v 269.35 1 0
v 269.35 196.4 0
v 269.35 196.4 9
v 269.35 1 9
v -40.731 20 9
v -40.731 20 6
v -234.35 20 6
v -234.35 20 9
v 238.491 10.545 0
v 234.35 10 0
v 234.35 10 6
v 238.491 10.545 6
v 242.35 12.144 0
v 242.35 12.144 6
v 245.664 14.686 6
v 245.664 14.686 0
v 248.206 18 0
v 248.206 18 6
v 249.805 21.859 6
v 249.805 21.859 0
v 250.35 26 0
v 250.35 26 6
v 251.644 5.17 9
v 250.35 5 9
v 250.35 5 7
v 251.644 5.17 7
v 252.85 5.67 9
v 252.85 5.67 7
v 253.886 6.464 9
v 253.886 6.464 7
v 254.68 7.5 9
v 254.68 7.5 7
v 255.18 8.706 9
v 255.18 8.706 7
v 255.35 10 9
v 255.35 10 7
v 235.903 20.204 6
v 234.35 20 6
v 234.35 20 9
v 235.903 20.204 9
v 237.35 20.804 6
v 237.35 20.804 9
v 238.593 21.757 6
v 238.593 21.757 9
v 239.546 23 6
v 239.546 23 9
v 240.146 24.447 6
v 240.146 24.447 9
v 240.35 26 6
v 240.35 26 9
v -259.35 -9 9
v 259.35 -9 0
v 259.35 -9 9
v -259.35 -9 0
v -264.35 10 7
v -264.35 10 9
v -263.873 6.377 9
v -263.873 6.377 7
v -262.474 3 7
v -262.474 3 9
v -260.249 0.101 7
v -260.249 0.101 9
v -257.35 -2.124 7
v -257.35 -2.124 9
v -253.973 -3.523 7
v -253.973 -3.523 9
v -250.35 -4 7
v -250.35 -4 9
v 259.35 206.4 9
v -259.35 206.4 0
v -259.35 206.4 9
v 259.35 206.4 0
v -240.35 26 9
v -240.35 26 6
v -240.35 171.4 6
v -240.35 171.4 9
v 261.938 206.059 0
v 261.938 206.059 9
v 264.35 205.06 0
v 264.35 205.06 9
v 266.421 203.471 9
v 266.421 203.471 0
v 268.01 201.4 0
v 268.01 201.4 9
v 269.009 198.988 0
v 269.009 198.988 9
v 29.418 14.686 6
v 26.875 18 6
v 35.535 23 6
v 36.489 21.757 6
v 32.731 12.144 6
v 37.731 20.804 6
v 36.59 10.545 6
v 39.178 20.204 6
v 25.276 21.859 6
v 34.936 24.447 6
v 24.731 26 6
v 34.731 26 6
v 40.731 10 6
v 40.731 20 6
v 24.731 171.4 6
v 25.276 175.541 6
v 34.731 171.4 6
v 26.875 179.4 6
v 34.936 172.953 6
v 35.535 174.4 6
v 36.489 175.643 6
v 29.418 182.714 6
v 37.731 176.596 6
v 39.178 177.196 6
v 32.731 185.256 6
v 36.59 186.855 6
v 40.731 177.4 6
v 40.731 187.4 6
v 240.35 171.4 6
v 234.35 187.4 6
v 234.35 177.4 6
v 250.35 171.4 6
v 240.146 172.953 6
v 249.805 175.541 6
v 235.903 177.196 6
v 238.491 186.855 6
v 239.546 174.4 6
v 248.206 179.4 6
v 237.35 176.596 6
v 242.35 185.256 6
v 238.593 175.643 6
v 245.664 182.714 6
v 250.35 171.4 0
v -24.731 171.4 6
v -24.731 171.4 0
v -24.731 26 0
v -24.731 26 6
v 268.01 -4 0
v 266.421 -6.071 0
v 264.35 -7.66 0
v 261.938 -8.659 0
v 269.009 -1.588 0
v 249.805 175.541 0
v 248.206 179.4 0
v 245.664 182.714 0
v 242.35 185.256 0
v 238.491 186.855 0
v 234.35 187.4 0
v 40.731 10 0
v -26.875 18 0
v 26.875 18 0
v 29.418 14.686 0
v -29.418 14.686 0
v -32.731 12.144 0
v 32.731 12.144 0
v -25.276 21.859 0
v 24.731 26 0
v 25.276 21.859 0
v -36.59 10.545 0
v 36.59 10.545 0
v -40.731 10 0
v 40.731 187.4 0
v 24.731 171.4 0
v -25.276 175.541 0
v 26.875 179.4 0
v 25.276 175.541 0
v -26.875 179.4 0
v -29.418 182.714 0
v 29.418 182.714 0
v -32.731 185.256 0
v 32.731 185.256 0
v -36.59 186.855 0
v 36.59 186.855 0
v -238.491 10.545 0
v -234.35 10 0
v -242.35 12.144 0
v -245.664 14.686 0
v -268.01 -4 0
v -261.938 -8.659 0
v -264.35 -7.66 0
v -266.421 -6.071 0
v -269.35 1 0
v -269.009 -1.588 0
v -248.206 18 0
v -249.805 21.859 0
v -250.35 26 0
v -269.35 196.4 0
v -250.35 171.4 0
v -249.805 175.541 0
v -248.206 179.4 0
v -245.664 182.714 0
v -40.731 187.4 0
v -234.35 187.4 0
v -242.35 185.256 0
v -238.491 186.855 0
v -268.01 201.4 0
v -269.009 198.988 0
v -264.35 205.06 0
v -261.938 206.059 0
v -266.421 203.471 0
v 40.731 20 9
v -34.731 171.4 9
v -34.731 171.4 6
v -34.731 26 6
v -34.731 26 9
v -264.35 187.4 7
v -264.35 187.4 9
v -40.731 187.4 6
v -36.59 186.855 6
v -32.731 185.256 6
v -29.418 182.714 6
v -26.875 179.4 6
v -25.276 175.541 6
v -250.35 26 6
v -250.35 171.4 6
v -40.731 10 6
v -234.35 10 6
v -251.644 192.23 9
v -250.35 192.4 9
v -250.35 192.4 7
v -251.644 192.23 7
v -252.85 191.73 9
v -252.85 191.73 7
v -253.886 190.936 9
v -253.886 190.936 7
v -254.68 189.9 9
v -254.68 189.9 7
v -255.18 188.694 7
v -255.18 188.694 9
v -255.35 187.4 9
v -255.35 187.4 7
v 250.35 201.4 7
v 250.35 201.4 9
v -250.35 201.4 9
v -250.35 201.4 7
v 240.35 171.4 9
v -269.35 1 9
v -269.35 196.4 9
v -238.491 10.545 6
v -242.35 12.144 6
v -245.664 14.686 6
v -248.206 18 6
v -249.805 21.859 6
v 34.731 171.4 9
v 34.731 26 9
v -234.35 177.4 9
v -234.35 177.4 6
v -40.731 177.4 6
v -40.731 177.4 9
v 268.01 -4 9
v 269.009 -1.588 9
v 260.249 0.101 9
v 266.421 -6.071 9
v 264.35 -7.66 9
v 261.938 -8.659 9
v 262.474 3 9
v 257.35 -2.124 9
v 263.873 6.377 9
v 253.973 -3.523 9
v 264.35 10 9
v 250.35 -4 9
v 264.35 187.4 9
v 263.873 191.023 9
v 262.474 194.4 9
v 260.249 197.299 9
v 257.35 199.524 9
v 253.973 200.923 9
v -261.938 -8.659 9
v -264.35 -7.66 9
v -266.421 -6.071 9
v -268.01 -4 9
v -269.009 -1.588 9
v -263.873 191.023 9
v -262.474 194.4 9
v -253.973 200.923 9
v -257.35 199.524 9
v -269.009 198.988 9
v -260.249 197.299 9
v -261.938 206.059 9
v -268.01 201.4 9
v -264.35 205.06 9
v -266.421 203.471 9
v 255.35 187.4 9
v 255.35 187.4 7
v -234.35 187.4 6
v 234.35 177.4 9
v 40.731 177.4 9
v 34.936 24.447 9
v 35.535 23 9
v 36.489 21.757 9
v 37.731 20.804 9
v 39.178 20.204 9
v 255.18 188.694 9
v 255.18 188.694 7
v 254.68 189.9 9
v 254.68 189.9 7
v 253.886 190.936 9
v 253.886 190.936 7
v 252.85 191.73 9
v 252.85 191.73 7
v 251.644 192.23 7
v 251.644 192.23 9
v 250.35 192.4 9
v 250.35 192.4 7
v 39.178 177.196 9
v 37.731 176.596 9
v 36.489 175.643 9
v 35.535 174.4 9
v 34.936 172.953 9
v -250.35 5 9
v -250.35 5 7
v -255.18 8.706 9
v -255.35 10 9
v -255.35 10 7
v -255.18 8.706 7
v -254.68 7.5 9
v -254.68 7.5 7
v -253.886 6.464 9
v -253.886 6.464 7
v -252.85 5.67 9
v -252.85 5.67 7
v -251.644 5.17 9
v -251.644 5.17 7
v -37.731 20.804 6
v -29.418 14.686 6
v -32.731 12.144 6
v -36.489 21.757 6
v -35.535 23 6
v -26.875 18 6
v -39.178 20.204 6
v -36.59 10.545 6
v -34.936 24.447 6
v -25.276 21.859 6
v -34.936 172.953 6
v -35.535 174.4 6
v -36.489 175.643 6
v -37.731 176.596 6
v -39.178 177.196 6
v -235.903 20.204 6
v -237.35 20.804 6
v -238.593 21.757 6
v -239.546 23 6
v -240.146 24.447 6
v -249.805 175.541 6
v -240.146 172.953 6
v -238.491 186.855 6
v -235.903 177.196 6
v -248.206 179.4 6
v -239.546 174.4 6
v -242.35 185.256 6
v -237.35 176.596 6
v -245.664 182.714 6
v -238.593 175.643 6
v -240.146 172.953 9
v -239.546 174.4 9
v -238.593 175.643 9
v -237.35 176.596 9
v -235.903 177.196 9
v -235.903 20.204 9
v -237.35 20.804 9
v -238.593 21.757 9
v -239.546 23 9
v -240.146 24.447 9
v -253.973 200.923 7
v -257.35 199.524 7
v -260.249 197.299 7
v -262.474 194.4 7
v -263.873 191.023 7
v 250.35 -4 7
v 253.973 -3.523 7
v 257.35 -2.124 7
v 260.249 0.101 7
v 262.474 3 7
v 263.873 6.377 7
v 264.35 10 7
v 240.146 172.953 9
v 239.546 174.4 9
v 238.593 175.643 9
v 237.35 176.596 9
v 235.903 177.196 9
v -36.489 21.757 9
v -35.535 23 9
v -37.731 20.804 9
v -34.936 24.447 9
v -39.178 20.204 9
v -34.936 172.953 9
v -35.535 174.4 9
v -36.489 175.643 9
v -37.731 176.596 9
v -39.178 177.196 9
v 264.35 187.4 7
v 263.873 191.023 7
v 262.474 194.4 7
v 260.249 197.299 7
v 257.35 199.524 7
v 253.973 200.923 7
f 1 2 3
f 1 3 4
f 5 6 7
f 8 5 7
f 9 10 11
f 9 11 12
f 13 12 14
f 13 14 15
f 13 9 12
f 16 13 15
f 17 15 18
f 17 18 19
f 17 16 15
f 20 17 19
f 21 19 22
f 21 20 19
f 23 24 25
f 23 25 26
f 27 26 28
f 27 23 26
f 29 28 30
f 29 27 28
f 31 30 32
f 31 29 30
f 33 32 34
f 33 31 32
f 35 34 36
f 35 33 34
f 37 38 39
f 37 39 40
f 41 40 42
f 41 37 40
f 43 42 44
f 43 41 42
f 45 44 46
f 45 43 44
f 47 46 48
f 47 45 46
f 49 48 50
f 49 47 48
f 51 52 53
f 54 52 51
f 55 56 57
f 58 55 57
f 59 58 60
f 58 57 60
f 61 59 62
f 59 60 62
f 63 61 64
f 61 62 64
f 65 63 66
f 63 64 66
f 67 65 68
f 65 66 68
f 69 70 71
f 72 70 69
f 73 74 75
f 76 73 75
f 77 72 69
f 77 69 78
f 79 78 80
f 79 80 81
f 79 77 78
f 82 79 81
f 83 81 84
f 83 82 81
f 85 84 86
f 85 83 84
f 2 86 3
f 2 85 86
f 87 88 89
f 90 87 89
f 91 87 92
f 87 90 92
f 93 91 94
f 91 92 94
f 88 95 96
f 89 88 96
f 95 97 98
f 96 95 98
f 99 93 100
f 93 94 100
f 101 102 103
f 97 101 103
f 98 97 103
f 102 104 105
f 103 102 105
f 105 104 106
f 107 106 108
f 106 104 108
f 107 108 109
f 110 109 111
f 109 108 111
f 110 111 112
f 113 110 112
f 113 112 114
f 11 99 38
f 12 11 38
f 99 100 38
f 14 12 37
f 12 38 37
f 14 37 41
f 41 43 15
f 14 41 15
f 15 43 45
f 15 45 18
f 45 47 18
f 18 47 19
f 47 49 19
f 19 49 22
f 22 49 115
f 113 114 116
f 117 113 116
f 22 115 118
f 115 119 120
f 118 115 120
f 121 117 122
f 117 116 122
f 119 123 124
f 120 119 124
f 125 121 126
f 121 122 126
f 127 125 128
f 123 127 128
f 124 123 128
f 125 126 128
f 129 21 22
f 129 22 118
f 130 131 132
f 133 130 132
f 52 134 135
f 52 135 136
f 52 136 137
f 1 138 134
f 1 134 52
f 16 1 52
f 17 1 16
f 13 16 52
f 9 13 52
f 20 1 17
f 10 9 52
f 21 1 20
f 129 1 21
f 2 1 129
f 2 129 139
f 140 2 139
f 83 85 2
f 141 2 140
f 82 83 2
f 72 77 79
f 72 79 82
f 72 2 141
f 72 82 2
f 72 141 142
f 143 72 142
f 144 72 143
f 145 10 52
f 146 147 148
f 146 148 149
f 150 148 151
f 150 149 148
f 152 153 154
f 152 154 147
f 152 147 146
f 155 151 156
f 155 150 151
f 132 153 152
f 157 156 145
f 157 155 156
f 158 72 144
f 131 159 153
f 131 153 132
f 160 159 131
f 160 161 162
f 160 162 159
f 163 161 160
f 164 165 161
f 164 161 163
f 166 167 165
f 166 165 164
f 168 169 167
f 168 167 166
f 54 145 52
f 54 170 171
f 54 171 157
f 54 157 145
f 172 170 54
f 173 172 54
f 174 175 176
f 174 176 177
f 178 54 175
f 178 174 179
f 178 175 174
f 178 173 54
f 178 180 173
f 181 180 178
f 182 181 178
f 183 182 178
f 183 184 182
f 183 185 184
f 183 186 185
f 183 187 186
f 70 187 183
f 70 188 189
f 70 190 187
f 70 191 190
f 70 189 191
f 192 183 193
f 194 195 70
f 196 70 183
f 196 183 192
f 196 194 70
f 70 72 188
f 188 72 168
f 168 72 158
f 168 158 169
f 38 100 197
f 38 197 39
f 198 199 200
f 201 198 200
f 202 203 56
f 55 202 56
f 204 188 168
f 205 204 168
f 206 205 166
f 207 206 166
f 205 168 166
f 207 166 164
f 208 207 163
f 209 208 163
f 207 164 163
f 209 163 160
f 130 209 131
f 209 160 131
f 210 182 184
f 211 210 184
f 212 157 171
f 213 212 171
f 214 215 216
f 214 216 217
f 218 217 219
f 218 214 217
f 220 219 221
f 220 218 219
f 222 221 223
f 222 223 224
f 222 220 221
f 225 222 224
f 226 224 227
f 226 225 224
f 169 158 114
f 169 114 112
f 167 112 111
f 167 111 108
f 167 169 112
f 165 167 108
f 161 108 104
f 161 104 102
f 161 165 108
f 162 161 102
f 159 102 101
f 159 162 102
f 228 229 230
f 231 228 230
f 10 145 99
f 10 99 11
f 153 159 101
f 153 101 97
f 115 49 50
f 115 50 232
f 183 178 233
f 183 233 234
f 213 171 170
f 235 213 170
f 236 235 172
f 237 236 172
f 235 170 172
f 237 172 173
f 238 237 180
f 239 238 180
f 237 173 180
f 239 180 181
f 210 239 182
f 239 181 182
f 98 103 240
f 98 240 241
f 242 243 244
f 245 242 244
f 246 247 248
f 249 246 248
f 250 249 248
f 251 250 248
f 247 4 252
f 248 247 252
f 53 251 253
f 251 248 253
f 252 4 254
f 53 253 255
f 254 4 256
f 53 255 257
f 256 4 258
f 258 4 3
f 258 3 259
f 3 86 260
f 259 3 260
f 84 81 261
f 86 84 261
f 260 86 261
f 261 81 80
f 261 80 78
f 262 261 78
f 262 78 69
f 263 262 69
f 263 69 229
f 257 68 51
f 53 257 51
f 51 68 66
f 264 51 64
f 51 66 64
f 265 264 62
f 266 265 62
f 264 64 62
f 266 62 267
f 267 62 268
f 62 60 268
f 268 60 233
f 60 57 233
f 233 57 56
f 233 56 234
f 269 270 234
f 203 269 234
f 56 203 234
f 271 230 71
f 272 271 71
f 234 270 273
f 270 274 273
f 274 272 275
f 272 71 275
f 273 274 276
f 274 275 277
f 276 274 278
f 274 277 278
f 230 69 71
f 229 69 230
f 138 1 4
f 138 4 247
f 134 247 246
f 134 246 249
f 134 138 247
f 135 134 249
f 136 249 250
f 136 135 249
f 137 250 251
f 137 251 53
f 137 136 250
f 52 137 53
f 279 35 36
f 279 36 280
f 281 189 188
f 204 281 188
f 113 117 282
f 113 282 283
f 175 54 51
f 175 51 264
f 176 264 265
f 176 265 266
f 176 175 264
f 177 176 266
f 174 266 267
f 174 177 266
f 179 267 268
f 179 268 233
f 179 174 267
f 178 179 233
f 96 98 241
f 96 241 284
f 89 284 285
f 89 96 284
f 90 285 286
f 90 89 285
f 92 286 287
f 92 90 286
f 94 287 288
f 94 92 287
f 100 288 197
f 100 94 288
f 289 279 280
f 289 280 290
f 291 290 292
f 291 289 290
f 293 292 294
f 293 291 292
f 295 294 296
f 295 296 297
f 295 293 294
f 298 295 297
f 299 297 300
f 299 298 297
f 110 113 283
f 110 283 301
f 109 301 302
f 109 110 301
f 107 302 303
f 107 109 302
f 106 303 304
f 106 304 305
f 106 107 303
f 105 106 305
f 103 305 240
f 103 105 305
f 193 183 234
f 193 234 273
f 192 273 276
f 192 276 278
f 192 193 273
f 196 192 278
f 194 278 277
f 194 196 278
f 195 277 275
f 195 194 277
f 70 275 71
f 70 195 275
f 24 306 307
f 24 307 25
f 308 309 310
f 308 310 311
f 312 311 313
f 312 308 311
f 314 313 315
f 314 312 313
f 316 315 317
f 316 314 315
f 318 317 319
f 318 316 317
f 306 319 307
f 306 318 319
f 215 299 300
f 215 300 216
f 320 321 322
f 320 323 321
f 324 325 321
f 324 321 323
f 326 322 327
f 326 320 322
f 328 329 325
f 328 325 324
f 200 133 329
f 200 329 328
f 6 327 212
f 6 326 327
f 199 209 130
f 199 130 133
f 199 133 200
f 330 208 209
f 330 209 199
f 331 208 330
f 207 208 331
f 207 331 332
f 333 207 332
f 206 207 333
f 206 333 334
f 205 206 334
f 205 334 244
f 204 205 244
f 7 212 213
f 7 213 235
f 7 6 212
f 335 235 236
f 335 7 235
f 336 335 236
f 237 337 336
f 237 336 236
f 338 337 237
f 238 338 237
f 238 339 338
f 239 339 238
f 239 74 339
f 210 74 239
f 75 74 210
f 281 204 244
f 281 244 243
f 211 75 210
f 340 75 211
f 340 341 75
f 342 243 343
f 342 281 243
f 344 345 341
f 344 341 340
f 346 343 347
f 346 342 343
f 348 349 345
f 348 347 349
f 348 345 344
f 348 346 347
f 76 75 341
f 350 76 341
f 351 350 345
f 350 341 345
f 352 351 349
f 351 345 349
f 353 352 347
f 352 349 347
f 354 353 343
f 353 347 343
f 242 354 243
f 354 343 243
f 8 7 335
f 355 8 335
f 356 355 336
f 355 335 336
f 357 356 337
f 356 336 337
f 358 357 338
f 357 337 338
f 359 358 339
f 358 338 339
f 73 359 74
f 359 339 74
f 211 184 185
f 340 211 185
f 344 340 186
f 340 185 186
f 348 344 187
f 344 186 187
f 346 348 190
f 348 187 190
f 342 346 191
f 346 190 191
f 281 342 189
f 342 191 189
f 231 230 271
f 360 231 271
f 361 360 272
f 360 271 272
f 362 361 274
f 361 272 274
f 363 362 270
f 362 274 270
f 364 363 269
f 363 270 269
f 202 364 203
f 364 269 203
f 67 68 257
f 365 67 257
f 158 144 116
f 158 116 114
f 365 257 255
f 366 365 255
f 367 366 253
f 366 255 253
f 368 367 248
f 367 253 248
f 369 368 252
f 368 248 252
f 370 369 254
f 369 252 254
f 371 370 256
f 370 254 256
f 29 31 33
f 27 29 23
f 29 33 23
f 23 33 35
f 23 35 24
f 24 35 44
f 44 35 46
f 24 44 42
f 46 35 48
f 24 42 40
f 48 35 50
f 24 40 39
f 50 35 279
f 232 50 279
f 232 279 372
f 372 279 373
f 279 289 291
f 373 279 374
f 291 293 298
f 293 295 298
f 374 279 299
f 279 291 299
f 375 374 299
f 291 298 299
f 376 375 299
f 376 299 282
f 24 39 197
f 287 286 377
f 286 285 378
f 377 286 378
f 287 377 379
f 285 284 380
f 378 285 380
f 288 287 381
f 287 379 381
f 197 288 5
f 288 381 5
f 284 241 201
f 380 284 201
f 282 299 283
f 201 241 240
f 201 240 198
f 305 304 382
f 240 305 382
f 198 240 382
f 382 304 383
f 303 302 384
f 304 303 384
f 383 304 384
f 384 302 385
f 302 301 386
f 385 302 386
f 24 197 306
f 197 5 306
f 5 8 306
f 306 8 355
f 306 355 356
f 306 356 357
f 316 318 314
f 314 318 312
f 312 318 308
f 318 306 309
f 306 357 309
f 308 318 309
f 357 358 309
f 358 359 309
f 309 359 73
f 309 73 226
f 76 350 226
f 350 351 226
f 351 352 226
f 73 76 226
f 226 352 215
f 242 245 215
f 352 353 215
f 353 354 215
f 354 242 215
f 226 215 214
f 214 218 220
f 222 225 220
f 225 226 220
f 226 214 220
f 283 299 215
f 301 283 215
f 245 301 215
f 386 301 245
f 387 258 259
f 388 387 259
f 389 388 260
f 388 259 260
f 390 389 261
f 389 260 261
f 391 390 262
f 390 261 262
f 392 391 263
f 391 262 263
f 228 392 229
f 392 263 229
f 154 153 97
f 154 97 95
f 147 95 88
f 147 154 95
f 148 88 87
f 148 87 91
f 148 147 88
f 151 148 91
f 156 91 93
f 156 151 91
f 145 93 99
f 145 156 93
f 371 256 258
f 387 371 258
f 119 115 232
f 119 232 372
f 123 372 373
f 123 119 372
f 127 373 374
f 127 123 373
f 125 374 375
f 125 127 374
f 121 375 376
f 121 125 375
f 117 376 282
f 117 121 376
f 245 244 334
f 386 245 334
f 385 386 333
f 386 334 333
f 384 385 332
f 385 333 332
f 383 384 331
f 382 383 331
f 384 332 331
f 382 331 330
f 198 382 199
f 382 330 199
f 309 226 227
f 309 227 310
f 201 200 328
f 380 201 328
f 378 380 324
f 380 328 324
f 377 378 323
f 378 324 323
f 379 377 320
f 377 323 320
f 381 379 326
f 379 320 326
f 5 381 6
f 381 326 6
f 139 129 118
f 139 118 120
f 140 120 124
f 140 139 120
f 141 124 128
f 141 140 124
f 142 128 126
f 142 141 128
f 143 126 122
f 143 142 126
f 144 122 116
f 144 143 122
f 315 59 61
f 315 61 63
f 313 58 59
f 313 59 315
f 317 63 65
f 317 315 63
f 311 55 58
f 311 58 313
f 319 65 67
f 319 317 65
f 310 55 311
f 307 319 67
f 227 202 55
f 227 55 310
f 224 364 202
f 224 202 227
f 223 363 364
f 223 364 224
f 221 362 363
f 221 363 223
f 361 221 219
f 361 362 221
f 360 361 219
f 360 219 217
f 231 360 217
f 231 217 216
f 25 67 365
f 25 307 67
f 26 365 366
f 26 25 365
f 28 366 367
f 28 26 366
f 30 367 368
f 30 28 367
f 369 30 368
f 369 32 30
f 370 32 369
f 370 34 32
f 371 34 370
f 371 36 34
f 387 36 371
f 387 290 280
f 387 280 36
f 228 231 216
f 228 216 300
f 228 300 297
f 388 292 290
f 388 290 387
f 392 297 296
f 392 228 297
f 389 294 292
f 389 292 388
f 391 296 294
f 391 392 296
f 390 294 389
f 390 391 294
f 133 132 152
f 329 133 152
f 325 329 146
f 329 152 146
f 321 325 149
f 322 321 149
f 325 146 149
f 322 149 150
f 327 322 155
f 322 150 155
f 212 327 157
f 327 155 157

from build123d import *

# Parameters (mm, degrees)
BOSS_EXTRUDE1_DEPTH = 9
CUT_EXTRUDE1_DEPTH  = 2
CUT_EXTRUDE2_DEPTH  = 9
CUT_EXTRUDE4_DEPTH  = 6


with BuildPart() as part:
    # Sketch1 → Boss-Extrude1 (new body)
    with BuildSketch(Plane.XY):
        with BuildLine():
            Line((259.35, -9), (-259.35, -9))
            ThreePointArc((-259.35, -9), (-266.421067812, -6.071067812), (-269.35, 1))
            Line((-269.35, 1), (-269.35, 196.4))
            ThreePointArc((-269.35, 196.4), (-266.421067812, 203.471067812), (-259.35, 206.4))
            Line((-259.35, 206.4), (259.35, 206.4))
            ThreePointArc((259.35, 206.4), (266.421067812, 203.471067812), (269.35, 196.4))
            Line((269.35, 196.4), (269.35, 1))
            ThreePointArc((269.35, 1), (266.421067812, -6.071067812), (259.35, -9))
        make_face()
    extrude(amount=BOSS_EXTRUDE1_DEPTH)

    # Sketch4 → Cut-Extrude1 (cut)
    with BuildSketch(Plane.XY.offset(9)):
        with BuildLine():
            Line((-250.35, -4), (250.35, -4))
            ThreePointArc((250.35, -4), (260.249494937, 0.100505063), (264.35, 10))
            Line((264.35, 10), (264.35, 187.4))
            ThreePointArc((264.35, 187.4), (260.249494937, 197.299494937), (250.35, 201.4))
            Line((250.35, 201.4), (-250.35, 201.4))
            ThreePointArc((-250.35, 201.4), (-260.249494937, 197.299494937), (-264.35, 187.4))
            Line((-264.35, 187.4), (-264.35, 10))
            ThreePointArc((-264.35, 10), (-260.249494937, 0.100505063), (-250.35, -4))
        make_face()
        with BuildLine():
            Line((-250.35, 5), (250.35, 5))
            ThreePointArc((250.35, 5), (253.885533906, 6.464466094), (255.35, 10))
            Line((255.35, 10), (255.35, 187.4))
            ThreePointArc((255.35, 187.4), (253.885533906, 190.935533906), (250.35, 192.4))
            Line((250.35, 192.4), (-250.35, 192.4))
            ThreePointArc((-250.35, 192.4), (-253.885533906, 190.935533906), (-255.35, 187.4))
            Line((-255.35, 187.4), (-255.35, 10))
            ThreePointArc((-255.35, 10), (-253.885533906, 6.464466094), (-250.35, 5))
        make_face(mode=Mode.SUBTRACT)
    extrude(amount=-CUT_EXTRUDE1_DEPTH, mode=Mode.SUBTRACT)

    # Sketch5 → Cut-Extrude2 (cut)
    with BuildSketch(Plane.XY):
        with BuildLine():
            Line((-234.35, 177.4), (-40.731266216, 177.4))
            ThreePointArc((-40.731266216, 177.4), (-36.488625529, 175.642640687), (-34.731266216, 171.4))
            Line((-34.731266216, 171.4), (-34.731266216, 26))
            ThreePointArc((-34.731266216, 26), (-36.488625529, 21.757359313), (-40.731266216, 20))
            Line((-40.731266216, 20), (-234.35, 20))
            ThreePointArc((-234.35, 20), (-238.592640687, 21.757359313), (-240.35, 26))
            Line((-240.35, 26), (-240.35, 171.4))
            ThreePointArc((-240.35, 171.4), (-238.592640687, 175.642640687), (-234.35, 177.4))
        make_face()
    cut_extrude2 = extrude(amount=CUT_EXTRUDE2_DEPTH, mode=Mode.SUBTRACT)

    # Sketch7 → Cut-Extrude4 (cut)
    with BuildSketch(Plane(origin=(0, 0, 0), x_dir=(-1, 0, 0), z_dir=(0, 0, -1))):
        with BuildLine():
            Line((250.35, 26), (250.35, 171.4))
            ThreePointArc((250.35, 171.4), (245.663708499, 182.713708499), (234.35, 187.4))
            Line((234.35, 187.4), (40.731266216, 187.4))
            ThreePointArc((40.731266216, 187.4), (29.417557717, 182.713708499), (24.731266216, 171.4))
            Line((24.731266216, 171.4), (24.731266216, 26))
            ThreePointArc((24.731266216, 26), (29.417557717, 14.686291501), (40.731266216, 10))
            Line((40.731266216, 10), (234.35, 10))
            ThreePointArc((234.35, 10), (245.663708499, 14.686291501), (250.35, 26))
        make_face()
    cut_extrude4 = extrude(amount=-CUT_EXTRUDE4_DEPTH, mode=Mode.SUBTRACT)

    # Mirror1: Cut-Extrude2, Cut-Extrude4 across plane
    add(cut_extrude2.mirror(Plane(origin=(0, 0, 0), x_dir=(0, 0, 1), z_dir=(1, 0, 0))), mode=Mode.SUBTRACT)
    add(cut_extrude4.mirror(Plane(origin=(0, 0, 0), x_dir=(0, 0, 1), z_dir=(1, 0, 0))), mode=Mode.SUBTRACT)


solid = part.part
